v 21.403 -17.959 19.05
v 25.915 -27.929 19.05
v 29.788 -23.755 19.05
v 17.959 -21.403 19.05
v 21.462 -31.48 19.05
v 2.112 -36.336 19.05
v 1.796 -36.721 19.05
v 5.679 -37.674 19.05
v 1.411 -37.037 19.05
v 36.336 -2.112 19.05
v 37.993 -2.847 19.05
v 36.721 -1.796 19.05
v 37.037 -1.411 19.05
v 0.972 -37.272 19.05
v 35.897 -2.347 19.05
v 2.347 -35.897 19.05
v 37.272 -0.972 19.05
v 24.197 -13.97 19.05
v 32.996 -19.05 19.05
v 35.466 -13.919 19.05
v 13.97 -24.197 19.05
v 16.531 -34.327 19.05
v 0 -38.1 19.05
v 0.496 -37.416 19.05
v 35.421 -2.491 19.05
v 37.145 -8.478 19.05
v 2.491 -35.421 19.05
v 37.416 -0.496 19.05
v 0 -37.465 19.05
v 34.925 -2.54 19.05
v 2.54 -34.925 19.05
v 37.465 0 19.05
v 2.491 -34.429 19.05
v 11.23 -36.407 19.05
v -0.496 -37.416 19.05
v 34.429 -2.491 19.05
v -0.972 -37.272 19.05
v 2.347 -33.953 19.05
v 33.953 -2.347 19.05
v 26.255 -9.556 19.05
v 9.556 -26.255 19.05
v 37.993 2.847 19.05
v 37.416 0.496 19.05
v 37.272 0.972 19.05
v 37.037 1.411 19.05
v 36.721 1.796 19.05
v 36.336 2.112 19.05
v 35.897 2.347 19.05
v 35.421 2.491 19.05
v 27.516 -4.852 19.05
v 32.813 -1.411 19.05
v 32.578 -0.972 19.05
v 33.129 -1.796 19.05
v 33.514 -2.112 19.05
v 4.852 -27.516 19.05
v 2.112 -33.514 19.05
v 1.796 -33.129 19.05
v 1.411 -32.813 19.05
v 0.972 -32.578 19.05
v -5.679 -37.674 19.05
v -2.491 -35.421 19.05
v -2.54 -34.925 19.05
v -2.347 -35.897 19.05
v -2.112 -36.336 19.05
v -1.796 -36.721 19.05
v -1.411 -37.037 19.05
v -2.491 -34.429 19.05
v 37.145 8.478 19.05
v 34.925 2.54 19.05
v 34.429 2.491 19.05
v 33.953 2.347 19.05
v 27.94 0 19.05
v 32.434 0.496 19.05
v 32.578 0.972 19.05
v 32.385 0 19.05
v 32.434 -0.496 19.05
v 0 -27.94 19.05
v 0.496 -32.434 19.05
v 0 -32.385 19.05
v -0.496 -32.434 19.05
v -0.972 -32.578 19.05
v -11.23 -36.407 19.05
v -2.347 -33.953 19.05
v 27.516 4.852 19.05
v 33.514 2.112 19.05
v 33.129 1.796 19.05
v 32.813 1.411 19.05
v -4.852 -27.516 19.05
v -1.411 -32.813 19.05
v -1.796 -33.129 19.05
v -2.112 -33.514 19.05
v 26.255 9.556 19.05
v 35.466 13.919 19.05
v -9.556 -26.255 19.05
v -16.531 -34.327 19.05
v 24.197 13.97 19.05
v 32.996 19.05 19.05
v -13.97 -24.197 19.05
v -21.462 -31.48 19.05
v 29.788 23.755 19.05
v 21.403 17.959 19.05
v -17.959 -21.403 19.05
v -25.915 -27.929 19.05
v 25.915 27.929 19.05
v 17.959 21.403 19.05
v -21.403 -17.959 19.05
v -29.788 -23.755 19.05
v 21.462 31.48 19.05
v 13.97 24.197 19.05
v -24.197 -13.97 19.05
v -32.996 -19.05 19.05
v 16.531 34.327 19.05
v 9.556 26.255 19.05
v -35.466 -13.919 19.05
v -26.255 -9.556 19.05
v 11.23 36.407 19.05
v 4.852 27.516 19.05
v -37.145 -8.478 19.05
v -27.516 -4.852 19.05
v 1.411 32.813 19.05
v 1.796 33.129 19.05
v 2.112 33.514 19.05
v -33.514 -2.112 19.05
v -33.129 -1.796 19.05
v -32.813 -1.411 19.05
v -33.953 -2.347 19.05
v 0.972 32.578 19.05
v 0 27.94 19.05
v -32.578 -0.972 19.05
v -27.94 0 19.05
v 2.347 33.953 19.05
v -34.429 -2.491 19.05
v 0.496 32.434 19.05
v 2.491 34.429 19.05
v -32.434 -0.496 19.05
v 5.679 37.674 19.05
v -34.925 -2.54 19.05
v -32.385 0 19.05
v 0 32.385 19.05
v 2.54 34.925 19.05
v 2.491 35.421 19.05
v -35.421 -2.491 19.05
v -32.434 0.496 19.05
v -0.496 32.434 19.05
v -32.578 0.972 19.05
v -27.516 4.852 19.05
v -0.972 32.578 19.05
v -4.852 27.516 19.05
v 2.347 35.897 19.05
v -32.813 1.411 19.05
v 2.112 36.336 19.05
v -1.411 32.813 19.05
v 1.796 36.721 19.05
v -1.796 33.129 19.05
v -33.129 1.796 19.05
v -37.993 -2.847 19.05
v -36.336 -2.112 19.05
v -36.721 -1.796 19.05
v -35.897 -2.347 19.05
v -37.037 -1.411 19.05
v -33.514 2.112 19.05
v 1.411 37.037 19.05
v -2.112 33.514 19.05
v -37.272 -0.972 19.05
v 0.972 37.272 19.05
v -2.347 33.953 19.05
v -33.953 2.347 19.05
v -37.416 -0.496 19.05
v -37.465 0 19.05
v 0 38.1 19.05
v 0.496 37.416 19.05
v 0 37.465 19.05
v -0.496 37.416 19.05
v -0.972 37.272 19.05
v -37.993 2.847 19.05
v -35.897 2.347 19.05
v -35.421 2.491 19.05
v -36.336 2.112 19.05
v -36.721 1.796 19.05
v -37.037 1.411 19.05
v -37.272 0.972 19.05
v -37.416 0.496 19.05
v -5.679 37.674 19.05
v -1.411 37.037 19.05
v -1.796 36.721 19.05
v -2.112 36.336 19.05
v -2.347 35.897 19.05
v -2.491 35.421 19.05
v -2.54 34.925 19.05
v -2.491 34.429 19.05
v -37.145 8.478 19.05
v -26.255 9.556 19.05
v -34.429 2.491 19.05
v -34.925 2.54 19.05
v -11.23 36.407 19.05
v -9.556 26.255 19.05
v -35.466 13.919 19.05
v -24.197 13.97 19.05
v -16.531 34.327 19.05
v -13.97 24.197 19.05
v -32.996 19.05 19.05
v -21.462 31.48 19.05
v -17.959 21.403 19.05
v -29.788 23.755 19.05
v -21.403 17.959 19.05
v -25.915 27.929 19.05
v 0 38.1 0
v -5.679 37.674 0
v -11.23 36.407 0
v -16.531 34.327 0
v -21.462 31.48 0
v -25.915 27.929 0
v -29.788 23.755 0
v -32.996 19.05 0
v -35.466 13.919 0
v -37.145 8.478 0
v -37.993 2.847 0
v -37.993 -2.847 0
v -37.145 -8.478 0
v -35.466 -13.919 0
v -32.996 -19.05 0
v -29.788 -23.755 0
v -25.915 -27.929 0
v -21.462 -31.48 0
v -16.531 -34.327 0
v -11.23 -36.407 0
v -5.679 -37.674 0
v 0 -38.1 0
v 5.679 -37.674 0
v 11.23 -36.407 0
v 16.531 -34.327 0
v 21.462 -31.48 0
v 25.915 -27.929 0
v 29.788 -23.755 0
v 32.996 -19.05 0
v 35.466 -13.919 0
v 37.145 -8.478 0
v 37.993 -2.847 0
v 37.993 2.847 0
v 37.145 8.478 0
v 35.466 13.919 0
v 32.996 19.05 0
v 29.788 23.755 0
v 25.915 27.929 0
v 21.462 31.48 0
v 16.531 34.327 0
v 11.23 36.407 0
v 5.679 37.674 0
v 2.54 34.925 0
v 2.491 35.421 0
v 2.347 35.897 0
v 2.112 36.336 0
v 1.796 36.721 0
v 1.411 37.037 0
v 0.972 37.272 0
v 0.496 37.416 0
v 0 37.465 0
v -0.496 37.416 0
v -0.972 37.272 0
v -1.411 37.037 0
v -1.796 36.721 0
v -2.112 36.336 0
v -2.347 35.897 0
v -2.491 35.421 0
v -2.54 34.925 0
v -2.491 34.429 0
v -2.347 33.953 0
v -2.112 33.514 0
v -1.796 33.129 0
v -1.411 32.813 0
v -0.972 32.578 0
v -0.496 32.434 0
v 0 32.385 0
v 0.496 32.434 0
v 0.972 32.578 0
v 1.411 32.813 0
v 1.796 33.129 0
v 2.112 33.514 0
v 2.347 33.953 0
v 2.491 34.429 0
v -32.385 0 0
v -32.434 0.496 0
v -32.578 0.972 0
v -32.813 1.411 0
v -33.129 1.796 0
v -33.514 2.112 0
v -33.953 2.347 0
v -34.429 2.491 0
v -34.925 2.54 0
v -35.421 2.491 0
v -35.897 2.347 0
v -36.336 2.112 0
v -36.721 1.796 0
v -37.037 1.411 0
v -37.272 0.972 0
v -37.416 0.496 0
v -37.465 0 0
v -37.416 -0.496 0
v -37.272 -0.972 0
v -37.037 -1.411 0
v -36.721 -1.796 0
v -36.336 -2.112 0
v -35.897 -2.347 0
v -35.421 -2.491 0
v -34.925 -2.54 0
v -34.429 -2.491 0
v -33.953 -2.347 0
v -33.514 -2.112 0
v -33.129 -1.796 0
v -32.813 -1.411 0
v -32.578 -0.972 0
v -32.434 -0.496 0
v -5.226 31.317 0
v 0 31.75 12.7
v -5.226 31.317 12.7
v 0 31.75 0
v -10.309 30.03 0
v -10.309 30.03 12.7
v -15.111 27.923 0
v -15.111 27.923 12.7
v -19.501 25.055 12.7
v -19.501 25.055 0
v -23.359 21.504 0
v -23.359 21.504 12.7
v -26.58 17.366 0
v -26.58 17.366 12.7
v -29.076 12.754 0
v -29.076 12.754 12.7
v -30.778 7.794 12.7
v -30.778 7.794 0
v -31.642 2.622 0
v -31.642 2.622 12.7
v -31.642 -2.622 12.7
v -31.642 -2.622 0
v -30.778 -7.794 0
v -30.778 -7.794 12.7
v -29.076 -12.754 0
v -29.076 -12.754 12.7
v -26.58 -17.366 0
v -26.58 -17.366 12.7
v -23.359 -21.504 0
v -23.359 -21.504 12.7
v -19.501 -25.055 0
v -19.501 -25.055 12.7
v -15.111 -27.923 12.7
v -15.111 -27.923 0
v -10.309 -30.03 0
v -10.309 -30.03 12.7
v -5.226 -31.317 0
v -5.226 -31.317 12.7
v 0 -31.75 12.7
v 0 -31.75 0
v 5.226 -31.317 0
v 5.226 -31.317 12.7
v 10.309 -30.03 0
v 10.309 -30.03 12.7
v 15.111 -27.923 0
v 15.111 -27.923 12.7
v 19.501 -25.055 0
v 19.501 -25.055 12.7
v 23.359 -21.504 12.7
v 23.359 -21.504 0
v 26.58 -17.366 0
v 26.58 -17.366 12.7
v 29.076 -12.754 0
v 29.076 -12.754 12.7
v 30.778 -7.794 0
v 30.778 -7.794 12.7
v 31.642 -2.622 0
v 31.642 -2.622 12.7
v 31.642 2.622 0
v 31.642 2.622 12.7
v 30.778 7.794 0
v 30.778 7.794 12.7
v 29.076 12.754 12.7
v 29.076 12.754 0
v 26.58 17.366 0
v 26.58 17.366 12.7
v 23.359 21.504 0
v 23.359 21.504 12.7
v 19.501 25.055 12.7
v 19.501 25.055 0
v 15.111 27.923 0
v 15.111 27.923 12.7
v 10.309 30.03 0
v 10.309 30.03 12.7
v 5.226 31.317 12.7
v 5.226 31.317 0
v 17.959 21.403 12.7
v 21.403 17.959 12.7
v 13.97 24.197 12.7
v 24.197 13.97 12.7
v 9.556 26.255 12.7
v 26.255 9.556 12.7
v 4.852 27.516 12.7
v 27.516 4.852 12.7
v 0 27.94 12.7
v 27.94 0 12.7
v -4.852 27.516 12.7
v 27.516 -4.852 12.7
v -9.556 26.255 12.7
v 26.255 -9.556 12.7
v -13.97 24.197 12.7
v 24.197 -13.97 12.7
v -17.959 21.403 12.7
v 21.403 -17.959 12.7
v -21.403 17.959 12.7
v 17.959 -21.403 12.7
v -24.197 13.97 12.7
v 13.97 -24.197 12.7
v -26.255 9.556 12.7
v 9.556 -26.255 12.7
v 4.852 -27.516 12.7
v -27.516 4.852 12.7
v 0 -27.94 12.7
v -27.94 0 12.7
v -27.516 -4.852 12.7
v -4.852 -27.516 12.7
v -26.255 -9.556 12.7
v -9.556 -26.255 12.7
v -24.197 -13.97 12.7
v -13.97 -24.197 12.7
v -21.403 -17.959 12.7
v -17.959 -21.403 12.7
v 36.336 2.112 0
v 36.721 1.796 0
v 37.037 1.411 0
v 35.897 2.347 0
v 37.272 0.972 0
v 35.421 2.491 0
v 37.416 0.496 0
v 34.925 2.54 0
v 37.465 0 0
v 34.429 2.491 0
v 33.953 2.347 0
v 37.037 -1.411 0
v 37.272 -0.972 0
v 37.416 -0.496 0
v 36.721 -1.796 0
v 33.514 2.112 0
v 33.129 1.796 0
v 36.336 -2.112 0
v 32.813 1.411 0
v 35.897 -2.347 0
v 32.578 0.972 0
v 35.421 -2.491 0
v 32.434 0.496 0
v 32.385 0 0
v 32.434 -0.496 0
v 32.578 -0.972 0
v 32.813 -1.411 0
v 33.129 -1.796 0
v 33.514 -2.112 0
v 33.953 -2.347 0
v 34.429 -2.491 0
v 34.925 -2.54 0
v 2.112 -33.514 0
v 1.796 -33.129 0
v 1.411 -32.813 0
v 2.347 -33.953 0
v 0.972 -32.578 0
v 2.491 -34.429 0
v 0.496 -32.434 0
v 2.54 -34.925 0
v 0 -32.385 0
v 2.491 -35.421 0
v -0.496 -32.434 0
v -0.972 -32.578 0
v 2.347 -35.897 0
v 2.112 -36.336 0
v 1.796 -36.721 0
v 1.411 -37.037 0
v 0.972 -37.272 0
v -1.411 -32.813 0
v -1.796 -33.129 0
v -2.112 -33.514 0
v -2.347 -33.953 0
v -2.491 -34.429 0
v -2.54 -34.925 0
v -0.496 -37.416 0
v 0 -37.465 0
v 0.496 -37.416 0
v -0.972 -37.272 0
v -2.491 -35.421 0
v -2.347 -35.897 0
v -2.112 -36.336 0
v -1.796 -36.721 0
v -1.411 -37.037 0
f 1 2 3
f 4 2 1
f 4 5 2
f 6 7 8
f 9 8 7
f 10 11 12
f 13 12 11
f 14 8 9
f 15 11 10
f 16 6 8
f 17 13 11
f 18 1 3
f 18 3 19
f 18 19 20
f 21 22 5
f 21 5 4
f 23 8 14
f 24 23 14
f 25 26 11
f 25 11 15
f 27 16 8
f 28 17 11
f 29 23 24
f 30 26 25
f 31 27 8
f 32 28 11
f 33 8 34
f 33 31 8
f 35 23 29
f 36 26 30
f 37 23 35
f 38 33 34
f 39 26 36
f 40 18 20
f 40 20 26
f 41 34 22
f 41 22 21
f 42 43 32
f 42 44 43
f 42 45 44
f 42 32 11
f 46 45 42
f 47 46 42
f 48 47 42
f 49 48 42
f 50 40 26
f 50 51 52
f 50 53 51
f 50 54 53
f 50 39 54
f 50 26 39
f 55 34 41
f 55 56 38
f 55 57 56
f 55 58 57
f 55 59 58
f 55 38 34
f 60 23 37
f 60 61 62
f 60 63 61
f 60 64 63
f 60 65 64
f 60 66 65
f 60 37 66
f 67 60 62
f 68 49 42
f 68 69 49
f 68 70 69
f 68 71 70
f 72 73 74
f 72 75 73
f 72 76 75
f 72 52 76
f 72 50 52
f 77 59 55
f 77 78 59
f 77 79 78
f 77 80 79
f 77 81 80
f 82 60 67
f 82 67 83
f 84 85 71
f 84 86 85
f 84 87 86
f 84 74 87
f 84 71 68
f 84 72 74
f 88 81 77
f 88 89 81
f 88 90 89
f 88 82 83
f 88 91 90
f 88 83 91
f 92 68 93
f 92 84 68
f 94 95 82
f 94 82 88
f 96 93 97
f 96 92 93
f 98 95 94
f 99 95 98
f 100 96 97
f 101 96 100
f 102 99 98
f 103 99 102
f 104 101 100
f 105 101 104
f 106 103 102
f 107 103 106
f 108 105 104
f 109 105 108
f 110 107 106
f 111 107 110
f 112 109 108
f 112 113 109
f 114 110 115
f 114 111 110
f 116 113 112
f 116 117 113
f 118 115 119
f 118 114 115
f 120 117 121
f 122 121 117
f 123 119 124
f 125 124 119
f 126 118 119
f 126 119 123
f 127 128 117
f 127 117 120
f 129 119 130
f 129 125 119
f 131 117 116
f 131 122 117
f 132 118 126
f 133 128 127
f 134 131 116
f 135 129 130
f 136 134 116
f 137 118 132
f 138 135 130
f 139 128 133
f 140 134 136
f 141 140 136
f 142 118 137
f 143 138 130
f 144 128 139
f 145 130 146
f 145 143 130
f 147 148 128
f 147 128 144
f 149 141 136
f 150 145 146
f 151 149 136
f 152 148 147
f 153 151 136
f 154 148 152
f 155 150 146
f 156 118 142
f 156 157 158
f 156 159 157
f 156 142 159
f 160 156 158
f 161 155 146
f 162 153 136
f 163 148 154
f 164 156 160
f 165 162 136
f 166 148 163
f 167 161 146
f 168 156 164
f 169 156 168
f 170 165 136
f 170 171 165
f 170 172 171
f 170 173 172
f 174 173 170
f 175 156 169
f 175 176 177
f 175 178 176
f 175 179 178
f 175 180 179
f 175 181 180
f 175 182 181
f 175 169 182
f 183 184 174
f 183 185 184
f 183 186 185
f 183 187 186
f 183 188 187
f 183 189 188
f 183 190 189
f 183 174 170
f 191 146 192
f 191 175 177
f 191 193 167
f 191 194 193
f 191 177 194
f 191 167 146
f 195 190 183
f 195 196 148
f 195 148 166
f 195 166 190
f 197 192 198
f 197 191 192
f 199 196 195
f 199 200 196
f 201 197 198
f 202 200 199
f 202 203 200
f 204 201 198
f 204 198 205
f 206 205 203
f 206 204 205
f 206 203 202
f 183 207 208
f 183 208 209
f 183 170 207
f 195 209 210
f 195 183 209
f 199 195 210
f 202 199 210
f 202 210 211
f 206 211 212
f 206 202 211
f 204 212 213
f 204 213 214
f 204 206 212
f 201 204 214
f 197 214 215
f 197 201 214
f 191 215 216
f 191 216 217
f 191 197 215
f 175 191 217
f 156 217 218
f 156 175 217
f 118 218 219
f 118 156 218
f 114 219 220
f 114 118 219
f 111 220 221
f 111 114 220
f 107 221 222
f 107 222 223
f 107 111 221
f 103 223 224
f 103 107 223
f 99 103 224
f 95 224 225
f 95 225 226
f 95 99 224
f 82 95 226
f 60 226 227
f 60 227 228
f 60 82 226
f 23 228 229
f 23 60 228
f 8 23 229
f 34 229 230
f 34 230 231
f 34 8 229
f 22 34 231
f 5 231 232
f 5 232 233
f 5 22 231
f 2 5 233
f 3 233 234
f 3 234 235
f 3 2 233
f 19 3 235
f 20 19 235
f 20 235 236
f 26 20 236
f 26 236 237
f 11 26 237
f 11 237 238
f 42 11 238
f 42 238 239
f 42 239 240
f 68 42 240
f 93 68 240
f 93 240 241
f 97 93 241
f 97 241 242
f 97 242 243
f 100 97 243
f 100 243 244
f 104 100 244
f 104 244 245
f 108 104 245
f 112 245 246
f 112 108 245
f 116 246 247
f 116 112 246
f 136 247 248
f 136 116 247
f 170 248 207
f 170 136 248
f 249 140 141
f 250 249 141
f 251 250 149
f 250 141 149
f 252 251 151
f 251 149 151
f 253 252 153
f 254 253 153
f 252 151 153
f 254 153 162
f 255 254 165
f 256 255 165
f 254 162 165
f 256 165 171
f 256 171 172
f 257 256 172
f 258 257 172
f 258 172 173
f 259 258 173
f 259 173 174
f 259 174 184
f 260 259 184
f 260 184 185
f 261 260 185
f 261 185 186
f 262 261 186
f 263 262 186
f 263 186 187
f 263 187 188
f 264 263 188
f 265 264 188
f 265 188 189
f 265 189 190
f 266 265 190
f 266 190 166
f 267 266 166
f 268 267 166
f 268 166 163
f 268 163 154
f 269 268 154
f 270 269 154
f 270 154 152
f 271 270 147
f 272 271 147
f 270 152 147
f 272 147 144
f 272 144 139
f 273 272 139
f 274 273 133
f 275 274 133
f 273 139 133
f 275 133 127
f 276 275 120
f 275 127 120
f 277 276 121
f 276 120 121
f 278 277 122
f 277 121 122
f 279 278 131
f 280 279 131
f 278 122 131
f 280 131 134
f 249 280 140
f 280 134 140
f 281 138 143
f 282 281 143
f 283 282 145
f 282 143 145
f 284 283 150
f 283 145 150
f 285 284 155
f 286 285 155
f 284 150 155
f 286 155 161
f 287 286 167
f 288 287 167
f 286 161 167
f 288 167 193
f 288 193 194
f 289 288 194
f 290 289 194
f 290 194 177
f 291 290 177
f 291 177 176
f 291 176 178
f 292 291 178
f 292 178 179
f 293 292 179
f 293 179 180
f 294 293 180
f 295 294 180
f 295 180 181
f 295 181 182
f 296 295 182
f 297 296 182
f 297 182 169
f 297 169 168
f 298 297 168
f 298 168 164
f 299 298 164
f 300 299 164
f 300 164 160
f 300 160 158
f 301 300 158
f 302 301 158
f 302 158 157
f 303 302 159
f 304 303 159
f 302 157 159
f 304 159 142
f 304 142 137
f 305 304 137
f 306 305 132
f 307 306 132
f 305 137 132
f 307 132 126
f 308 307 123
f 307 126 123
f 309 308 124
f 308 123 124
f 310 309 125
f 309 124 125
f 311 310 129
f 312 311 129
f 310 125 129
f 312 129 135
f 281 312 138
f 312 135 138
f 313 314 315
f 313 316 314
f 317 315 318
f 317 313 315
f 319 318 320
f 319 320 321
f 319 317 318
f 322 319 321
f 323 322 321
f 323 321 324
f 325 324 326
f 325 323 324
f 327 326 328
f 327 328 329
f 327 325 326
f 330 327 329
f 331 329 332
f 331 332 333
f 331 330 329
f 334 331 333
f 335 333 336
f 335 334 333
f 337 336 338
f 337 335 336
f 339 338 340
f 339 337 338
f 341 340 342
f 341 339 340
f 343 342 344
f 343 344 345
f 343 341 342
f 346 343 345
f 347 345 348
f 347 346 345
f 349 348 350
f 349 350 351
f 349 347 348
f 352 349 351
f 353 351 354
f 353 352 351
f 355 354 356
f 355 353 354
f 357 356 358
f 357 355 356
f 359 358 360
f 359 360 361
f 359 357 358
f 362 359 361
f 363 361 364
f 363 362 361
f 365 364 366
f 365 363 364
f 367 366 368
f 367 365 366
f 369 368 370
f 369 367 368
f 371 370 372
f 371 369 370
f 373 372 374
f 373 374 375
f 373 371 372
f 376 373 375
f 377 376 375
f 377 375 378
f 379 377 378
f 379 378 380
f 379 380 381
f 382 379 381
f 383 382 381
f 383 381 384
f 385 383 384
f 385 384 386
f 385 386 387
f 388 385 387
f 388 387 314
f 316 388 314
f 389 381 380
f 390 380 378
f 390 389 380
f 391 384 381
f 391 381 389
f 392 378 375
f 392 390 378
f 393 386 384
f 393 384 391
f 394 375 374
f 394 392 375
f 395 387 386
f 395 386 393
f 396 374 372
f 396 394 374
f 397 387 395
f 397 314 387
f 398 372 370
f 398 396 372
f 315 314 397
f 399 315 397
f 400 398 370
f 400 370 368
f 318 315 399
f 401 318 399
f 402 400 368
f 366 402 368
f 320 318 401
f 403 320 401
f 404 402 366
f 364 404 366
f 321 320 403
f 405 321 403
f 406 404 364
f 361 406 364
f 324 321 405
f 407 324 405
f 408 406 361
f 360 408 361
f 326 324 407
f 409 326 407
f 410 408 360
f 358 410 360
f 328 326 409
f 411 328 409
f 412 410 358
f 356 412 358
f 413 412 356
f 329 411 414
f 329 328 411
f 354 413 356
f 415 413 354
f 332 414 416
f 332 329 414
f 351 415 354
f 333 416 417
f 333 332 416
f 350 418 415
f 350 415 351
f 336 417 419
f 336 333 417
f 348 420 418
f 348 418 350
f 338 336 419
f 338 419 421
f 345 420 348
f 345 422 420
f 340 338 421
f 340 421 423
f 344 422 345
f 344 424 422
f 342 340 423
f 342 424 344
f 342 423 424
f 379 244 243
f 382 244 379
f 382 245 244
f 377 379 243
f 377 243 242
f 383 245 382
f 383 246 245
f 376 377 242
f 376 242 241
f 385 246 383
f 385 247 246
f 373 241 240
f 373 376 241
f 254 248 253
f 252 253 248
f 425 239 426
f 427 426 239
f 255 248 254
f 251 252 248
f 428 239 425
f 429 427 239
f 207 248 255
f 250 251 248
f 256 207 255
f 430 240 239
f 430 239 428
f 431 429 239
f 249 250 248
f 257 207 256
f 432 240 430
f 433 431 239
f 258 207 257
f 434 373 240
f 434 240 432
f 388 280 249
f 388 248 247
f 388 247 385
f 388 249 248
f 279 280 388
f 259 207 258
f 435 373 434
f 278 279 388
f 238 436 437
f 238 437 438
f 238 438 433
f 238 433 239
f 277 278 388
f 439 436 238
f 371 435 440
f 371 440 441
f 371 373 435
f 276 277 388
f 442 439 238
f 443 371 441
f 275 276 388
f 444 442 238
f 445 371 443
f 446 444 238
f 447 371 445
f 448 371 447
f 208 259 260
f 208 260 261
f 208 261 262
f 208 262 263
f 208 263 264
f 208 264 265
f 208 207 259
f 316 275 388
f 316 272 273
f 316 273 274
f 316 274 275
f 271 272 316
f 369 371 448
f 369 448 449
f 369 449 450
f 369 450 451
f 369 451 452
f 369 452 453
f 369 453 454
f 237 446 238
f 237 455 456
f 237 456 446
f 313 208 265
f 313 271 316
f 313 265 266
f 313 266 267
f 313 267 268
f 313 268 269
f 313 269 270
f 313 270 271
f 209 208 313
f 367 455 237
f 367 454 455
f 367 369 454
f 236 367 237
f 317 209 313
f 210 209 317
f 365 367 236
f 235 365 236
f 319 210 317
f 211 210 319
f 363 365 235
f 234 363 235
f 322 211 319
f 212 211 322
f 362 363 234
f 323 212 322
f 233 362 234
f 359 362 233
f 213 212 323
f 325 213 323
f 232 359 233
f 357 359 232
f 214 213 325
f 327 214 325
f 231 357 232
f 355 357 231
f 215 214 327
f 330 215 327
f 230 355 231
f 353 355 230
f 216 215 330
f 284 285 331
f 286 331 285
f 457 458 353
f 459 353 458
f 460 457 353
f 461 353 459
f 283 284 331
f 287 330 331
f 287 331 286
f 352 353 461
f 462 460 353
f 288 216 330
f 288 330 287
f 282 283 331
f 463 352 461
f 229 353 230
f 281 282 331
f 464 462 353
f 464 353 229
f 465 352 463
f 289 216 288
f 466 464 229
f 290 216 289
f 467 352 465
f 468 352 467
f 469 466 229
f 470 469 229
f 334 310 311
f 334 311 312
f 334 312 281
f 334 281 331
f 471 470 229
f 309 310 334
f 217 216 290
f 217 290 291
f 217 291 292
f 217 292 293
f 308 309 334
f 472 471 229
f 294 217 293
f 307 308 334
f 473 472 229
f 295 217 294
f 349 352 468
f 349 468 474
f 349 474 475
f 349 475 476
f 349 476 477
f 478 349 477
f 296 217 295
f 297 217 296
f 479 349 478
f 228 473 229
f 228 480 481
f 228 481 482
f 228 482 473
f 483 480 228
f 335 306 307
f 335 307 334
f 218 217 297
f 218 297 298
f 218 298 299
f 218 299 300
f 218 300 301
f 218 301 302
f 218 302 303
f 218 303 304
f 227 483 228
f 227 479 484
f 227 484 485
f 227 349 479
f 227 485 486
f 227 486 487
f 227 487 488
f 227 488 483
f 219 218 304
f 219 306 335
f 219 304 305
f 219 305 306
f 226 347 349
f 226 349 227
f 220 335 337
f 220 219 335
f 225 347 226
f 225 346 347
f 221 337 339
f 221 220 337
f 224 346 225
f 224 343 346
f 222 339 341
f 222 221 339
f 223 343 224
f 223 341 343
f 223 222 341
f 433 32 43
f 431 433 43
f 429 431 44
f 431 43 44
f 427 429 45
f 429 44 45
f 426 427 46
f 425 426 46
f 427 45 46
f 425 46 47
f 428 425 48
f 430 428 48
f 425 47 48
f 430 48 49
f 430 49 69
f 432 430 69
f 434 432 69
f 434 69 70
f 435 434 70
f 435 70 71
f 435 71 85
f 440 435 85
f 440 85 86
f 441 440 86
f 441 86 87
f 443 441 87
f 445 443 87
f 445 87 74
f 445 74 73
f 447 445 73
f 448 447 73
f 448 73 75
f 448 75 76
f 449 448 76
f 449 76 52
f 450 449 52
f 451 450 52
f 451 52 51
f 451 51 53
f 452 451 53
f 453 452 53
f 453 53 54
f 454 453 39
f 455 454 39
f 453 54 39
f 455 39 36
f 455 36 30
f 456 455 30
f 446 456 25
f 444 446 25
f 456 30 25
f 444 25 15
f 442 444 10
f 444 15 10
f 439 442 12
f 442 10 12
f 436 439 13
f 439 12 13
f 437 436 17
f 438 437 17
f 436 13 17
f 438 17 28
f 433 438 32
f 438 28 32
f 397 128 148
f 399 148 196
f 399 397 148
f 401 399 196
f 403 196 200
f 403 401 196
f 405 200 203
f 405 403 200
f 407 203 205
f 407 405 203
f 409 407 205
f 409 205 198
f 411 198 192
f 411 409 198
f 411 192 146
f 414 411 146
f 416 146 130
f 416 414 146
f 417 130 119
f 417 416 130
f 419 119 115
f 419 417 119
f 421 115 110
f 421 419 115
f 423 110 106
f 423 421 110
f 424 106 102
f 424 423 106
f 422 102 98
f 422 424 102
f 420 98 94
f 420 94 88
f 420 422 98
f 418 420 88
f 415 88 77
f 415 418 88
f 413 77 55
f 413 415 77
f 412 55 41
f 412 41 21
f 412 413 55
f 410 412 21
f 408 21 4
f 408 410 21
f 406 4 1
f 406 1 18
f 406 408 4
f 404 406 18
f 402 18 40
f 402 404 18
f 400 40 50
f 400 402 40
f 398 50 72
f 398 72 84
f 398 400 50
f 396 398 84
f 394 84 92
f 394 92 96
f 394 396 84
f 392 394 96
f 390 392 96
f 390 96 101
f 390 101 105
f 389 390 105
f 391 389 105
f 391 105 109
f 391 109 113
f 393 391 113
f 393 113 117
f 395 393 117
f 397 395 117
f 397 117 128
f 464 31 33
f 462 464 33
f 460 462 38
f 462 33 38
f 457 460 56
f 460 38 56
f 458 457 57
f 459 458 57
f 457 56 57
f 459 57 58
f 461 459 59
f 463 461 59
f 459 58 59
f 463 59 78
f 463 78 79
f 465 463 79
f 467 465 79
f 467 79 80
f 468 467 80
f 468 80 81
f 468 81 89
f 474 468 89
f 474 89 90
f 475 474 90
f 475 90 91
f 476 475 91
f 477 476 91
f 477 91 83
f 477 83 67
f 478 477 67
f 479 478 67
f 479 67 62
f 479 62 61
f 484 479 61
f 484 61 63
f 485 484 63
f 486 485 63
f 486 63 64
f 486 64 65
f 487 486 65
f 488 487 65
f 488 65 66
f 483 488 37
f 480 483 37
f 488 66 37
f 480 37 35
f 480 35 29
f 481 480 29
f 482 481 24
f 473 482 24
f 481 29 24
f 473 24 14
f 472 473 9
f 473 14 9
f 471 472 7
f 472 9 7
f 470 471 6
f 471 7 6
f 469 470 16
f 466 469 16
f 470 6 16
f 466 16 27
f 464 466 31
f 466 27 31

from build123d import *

# Parameters (mm, degrees)
F2_R     = 2.54
F3_DEPTH = 25.4


with BuildPart() as f1:
    # F0 (on Right) → F1 (revolve)
    with BuildSketch(Plane.YZ):
        Polygon((31.75, 12.7), (31.75, 0), (38.1, 0), (38.1, 19.05), (27.94, 19.05), (27.94, 12.7), align=None)
    revolve(axis=Axis((0, 0, 13.59911), (0, 0, 1)))

    # F2 (on face) → F3 (cut)
    with BuildSketch(Plane.XY.offset(19.05)):
        with Locations((-34.925, 0)):
            Circle(F2_R)
        with Locations((0, 34.925)):
            Circle(F2_R)
        with Locations((34.925, 0)):
            Circle(F2_R)
        with Locations((0, -34.925)):
            Circle(F2_R)
    extrude(amount=-F3_DEPTH, mode=Mode.SUBTRACT)


solid = f1.part
